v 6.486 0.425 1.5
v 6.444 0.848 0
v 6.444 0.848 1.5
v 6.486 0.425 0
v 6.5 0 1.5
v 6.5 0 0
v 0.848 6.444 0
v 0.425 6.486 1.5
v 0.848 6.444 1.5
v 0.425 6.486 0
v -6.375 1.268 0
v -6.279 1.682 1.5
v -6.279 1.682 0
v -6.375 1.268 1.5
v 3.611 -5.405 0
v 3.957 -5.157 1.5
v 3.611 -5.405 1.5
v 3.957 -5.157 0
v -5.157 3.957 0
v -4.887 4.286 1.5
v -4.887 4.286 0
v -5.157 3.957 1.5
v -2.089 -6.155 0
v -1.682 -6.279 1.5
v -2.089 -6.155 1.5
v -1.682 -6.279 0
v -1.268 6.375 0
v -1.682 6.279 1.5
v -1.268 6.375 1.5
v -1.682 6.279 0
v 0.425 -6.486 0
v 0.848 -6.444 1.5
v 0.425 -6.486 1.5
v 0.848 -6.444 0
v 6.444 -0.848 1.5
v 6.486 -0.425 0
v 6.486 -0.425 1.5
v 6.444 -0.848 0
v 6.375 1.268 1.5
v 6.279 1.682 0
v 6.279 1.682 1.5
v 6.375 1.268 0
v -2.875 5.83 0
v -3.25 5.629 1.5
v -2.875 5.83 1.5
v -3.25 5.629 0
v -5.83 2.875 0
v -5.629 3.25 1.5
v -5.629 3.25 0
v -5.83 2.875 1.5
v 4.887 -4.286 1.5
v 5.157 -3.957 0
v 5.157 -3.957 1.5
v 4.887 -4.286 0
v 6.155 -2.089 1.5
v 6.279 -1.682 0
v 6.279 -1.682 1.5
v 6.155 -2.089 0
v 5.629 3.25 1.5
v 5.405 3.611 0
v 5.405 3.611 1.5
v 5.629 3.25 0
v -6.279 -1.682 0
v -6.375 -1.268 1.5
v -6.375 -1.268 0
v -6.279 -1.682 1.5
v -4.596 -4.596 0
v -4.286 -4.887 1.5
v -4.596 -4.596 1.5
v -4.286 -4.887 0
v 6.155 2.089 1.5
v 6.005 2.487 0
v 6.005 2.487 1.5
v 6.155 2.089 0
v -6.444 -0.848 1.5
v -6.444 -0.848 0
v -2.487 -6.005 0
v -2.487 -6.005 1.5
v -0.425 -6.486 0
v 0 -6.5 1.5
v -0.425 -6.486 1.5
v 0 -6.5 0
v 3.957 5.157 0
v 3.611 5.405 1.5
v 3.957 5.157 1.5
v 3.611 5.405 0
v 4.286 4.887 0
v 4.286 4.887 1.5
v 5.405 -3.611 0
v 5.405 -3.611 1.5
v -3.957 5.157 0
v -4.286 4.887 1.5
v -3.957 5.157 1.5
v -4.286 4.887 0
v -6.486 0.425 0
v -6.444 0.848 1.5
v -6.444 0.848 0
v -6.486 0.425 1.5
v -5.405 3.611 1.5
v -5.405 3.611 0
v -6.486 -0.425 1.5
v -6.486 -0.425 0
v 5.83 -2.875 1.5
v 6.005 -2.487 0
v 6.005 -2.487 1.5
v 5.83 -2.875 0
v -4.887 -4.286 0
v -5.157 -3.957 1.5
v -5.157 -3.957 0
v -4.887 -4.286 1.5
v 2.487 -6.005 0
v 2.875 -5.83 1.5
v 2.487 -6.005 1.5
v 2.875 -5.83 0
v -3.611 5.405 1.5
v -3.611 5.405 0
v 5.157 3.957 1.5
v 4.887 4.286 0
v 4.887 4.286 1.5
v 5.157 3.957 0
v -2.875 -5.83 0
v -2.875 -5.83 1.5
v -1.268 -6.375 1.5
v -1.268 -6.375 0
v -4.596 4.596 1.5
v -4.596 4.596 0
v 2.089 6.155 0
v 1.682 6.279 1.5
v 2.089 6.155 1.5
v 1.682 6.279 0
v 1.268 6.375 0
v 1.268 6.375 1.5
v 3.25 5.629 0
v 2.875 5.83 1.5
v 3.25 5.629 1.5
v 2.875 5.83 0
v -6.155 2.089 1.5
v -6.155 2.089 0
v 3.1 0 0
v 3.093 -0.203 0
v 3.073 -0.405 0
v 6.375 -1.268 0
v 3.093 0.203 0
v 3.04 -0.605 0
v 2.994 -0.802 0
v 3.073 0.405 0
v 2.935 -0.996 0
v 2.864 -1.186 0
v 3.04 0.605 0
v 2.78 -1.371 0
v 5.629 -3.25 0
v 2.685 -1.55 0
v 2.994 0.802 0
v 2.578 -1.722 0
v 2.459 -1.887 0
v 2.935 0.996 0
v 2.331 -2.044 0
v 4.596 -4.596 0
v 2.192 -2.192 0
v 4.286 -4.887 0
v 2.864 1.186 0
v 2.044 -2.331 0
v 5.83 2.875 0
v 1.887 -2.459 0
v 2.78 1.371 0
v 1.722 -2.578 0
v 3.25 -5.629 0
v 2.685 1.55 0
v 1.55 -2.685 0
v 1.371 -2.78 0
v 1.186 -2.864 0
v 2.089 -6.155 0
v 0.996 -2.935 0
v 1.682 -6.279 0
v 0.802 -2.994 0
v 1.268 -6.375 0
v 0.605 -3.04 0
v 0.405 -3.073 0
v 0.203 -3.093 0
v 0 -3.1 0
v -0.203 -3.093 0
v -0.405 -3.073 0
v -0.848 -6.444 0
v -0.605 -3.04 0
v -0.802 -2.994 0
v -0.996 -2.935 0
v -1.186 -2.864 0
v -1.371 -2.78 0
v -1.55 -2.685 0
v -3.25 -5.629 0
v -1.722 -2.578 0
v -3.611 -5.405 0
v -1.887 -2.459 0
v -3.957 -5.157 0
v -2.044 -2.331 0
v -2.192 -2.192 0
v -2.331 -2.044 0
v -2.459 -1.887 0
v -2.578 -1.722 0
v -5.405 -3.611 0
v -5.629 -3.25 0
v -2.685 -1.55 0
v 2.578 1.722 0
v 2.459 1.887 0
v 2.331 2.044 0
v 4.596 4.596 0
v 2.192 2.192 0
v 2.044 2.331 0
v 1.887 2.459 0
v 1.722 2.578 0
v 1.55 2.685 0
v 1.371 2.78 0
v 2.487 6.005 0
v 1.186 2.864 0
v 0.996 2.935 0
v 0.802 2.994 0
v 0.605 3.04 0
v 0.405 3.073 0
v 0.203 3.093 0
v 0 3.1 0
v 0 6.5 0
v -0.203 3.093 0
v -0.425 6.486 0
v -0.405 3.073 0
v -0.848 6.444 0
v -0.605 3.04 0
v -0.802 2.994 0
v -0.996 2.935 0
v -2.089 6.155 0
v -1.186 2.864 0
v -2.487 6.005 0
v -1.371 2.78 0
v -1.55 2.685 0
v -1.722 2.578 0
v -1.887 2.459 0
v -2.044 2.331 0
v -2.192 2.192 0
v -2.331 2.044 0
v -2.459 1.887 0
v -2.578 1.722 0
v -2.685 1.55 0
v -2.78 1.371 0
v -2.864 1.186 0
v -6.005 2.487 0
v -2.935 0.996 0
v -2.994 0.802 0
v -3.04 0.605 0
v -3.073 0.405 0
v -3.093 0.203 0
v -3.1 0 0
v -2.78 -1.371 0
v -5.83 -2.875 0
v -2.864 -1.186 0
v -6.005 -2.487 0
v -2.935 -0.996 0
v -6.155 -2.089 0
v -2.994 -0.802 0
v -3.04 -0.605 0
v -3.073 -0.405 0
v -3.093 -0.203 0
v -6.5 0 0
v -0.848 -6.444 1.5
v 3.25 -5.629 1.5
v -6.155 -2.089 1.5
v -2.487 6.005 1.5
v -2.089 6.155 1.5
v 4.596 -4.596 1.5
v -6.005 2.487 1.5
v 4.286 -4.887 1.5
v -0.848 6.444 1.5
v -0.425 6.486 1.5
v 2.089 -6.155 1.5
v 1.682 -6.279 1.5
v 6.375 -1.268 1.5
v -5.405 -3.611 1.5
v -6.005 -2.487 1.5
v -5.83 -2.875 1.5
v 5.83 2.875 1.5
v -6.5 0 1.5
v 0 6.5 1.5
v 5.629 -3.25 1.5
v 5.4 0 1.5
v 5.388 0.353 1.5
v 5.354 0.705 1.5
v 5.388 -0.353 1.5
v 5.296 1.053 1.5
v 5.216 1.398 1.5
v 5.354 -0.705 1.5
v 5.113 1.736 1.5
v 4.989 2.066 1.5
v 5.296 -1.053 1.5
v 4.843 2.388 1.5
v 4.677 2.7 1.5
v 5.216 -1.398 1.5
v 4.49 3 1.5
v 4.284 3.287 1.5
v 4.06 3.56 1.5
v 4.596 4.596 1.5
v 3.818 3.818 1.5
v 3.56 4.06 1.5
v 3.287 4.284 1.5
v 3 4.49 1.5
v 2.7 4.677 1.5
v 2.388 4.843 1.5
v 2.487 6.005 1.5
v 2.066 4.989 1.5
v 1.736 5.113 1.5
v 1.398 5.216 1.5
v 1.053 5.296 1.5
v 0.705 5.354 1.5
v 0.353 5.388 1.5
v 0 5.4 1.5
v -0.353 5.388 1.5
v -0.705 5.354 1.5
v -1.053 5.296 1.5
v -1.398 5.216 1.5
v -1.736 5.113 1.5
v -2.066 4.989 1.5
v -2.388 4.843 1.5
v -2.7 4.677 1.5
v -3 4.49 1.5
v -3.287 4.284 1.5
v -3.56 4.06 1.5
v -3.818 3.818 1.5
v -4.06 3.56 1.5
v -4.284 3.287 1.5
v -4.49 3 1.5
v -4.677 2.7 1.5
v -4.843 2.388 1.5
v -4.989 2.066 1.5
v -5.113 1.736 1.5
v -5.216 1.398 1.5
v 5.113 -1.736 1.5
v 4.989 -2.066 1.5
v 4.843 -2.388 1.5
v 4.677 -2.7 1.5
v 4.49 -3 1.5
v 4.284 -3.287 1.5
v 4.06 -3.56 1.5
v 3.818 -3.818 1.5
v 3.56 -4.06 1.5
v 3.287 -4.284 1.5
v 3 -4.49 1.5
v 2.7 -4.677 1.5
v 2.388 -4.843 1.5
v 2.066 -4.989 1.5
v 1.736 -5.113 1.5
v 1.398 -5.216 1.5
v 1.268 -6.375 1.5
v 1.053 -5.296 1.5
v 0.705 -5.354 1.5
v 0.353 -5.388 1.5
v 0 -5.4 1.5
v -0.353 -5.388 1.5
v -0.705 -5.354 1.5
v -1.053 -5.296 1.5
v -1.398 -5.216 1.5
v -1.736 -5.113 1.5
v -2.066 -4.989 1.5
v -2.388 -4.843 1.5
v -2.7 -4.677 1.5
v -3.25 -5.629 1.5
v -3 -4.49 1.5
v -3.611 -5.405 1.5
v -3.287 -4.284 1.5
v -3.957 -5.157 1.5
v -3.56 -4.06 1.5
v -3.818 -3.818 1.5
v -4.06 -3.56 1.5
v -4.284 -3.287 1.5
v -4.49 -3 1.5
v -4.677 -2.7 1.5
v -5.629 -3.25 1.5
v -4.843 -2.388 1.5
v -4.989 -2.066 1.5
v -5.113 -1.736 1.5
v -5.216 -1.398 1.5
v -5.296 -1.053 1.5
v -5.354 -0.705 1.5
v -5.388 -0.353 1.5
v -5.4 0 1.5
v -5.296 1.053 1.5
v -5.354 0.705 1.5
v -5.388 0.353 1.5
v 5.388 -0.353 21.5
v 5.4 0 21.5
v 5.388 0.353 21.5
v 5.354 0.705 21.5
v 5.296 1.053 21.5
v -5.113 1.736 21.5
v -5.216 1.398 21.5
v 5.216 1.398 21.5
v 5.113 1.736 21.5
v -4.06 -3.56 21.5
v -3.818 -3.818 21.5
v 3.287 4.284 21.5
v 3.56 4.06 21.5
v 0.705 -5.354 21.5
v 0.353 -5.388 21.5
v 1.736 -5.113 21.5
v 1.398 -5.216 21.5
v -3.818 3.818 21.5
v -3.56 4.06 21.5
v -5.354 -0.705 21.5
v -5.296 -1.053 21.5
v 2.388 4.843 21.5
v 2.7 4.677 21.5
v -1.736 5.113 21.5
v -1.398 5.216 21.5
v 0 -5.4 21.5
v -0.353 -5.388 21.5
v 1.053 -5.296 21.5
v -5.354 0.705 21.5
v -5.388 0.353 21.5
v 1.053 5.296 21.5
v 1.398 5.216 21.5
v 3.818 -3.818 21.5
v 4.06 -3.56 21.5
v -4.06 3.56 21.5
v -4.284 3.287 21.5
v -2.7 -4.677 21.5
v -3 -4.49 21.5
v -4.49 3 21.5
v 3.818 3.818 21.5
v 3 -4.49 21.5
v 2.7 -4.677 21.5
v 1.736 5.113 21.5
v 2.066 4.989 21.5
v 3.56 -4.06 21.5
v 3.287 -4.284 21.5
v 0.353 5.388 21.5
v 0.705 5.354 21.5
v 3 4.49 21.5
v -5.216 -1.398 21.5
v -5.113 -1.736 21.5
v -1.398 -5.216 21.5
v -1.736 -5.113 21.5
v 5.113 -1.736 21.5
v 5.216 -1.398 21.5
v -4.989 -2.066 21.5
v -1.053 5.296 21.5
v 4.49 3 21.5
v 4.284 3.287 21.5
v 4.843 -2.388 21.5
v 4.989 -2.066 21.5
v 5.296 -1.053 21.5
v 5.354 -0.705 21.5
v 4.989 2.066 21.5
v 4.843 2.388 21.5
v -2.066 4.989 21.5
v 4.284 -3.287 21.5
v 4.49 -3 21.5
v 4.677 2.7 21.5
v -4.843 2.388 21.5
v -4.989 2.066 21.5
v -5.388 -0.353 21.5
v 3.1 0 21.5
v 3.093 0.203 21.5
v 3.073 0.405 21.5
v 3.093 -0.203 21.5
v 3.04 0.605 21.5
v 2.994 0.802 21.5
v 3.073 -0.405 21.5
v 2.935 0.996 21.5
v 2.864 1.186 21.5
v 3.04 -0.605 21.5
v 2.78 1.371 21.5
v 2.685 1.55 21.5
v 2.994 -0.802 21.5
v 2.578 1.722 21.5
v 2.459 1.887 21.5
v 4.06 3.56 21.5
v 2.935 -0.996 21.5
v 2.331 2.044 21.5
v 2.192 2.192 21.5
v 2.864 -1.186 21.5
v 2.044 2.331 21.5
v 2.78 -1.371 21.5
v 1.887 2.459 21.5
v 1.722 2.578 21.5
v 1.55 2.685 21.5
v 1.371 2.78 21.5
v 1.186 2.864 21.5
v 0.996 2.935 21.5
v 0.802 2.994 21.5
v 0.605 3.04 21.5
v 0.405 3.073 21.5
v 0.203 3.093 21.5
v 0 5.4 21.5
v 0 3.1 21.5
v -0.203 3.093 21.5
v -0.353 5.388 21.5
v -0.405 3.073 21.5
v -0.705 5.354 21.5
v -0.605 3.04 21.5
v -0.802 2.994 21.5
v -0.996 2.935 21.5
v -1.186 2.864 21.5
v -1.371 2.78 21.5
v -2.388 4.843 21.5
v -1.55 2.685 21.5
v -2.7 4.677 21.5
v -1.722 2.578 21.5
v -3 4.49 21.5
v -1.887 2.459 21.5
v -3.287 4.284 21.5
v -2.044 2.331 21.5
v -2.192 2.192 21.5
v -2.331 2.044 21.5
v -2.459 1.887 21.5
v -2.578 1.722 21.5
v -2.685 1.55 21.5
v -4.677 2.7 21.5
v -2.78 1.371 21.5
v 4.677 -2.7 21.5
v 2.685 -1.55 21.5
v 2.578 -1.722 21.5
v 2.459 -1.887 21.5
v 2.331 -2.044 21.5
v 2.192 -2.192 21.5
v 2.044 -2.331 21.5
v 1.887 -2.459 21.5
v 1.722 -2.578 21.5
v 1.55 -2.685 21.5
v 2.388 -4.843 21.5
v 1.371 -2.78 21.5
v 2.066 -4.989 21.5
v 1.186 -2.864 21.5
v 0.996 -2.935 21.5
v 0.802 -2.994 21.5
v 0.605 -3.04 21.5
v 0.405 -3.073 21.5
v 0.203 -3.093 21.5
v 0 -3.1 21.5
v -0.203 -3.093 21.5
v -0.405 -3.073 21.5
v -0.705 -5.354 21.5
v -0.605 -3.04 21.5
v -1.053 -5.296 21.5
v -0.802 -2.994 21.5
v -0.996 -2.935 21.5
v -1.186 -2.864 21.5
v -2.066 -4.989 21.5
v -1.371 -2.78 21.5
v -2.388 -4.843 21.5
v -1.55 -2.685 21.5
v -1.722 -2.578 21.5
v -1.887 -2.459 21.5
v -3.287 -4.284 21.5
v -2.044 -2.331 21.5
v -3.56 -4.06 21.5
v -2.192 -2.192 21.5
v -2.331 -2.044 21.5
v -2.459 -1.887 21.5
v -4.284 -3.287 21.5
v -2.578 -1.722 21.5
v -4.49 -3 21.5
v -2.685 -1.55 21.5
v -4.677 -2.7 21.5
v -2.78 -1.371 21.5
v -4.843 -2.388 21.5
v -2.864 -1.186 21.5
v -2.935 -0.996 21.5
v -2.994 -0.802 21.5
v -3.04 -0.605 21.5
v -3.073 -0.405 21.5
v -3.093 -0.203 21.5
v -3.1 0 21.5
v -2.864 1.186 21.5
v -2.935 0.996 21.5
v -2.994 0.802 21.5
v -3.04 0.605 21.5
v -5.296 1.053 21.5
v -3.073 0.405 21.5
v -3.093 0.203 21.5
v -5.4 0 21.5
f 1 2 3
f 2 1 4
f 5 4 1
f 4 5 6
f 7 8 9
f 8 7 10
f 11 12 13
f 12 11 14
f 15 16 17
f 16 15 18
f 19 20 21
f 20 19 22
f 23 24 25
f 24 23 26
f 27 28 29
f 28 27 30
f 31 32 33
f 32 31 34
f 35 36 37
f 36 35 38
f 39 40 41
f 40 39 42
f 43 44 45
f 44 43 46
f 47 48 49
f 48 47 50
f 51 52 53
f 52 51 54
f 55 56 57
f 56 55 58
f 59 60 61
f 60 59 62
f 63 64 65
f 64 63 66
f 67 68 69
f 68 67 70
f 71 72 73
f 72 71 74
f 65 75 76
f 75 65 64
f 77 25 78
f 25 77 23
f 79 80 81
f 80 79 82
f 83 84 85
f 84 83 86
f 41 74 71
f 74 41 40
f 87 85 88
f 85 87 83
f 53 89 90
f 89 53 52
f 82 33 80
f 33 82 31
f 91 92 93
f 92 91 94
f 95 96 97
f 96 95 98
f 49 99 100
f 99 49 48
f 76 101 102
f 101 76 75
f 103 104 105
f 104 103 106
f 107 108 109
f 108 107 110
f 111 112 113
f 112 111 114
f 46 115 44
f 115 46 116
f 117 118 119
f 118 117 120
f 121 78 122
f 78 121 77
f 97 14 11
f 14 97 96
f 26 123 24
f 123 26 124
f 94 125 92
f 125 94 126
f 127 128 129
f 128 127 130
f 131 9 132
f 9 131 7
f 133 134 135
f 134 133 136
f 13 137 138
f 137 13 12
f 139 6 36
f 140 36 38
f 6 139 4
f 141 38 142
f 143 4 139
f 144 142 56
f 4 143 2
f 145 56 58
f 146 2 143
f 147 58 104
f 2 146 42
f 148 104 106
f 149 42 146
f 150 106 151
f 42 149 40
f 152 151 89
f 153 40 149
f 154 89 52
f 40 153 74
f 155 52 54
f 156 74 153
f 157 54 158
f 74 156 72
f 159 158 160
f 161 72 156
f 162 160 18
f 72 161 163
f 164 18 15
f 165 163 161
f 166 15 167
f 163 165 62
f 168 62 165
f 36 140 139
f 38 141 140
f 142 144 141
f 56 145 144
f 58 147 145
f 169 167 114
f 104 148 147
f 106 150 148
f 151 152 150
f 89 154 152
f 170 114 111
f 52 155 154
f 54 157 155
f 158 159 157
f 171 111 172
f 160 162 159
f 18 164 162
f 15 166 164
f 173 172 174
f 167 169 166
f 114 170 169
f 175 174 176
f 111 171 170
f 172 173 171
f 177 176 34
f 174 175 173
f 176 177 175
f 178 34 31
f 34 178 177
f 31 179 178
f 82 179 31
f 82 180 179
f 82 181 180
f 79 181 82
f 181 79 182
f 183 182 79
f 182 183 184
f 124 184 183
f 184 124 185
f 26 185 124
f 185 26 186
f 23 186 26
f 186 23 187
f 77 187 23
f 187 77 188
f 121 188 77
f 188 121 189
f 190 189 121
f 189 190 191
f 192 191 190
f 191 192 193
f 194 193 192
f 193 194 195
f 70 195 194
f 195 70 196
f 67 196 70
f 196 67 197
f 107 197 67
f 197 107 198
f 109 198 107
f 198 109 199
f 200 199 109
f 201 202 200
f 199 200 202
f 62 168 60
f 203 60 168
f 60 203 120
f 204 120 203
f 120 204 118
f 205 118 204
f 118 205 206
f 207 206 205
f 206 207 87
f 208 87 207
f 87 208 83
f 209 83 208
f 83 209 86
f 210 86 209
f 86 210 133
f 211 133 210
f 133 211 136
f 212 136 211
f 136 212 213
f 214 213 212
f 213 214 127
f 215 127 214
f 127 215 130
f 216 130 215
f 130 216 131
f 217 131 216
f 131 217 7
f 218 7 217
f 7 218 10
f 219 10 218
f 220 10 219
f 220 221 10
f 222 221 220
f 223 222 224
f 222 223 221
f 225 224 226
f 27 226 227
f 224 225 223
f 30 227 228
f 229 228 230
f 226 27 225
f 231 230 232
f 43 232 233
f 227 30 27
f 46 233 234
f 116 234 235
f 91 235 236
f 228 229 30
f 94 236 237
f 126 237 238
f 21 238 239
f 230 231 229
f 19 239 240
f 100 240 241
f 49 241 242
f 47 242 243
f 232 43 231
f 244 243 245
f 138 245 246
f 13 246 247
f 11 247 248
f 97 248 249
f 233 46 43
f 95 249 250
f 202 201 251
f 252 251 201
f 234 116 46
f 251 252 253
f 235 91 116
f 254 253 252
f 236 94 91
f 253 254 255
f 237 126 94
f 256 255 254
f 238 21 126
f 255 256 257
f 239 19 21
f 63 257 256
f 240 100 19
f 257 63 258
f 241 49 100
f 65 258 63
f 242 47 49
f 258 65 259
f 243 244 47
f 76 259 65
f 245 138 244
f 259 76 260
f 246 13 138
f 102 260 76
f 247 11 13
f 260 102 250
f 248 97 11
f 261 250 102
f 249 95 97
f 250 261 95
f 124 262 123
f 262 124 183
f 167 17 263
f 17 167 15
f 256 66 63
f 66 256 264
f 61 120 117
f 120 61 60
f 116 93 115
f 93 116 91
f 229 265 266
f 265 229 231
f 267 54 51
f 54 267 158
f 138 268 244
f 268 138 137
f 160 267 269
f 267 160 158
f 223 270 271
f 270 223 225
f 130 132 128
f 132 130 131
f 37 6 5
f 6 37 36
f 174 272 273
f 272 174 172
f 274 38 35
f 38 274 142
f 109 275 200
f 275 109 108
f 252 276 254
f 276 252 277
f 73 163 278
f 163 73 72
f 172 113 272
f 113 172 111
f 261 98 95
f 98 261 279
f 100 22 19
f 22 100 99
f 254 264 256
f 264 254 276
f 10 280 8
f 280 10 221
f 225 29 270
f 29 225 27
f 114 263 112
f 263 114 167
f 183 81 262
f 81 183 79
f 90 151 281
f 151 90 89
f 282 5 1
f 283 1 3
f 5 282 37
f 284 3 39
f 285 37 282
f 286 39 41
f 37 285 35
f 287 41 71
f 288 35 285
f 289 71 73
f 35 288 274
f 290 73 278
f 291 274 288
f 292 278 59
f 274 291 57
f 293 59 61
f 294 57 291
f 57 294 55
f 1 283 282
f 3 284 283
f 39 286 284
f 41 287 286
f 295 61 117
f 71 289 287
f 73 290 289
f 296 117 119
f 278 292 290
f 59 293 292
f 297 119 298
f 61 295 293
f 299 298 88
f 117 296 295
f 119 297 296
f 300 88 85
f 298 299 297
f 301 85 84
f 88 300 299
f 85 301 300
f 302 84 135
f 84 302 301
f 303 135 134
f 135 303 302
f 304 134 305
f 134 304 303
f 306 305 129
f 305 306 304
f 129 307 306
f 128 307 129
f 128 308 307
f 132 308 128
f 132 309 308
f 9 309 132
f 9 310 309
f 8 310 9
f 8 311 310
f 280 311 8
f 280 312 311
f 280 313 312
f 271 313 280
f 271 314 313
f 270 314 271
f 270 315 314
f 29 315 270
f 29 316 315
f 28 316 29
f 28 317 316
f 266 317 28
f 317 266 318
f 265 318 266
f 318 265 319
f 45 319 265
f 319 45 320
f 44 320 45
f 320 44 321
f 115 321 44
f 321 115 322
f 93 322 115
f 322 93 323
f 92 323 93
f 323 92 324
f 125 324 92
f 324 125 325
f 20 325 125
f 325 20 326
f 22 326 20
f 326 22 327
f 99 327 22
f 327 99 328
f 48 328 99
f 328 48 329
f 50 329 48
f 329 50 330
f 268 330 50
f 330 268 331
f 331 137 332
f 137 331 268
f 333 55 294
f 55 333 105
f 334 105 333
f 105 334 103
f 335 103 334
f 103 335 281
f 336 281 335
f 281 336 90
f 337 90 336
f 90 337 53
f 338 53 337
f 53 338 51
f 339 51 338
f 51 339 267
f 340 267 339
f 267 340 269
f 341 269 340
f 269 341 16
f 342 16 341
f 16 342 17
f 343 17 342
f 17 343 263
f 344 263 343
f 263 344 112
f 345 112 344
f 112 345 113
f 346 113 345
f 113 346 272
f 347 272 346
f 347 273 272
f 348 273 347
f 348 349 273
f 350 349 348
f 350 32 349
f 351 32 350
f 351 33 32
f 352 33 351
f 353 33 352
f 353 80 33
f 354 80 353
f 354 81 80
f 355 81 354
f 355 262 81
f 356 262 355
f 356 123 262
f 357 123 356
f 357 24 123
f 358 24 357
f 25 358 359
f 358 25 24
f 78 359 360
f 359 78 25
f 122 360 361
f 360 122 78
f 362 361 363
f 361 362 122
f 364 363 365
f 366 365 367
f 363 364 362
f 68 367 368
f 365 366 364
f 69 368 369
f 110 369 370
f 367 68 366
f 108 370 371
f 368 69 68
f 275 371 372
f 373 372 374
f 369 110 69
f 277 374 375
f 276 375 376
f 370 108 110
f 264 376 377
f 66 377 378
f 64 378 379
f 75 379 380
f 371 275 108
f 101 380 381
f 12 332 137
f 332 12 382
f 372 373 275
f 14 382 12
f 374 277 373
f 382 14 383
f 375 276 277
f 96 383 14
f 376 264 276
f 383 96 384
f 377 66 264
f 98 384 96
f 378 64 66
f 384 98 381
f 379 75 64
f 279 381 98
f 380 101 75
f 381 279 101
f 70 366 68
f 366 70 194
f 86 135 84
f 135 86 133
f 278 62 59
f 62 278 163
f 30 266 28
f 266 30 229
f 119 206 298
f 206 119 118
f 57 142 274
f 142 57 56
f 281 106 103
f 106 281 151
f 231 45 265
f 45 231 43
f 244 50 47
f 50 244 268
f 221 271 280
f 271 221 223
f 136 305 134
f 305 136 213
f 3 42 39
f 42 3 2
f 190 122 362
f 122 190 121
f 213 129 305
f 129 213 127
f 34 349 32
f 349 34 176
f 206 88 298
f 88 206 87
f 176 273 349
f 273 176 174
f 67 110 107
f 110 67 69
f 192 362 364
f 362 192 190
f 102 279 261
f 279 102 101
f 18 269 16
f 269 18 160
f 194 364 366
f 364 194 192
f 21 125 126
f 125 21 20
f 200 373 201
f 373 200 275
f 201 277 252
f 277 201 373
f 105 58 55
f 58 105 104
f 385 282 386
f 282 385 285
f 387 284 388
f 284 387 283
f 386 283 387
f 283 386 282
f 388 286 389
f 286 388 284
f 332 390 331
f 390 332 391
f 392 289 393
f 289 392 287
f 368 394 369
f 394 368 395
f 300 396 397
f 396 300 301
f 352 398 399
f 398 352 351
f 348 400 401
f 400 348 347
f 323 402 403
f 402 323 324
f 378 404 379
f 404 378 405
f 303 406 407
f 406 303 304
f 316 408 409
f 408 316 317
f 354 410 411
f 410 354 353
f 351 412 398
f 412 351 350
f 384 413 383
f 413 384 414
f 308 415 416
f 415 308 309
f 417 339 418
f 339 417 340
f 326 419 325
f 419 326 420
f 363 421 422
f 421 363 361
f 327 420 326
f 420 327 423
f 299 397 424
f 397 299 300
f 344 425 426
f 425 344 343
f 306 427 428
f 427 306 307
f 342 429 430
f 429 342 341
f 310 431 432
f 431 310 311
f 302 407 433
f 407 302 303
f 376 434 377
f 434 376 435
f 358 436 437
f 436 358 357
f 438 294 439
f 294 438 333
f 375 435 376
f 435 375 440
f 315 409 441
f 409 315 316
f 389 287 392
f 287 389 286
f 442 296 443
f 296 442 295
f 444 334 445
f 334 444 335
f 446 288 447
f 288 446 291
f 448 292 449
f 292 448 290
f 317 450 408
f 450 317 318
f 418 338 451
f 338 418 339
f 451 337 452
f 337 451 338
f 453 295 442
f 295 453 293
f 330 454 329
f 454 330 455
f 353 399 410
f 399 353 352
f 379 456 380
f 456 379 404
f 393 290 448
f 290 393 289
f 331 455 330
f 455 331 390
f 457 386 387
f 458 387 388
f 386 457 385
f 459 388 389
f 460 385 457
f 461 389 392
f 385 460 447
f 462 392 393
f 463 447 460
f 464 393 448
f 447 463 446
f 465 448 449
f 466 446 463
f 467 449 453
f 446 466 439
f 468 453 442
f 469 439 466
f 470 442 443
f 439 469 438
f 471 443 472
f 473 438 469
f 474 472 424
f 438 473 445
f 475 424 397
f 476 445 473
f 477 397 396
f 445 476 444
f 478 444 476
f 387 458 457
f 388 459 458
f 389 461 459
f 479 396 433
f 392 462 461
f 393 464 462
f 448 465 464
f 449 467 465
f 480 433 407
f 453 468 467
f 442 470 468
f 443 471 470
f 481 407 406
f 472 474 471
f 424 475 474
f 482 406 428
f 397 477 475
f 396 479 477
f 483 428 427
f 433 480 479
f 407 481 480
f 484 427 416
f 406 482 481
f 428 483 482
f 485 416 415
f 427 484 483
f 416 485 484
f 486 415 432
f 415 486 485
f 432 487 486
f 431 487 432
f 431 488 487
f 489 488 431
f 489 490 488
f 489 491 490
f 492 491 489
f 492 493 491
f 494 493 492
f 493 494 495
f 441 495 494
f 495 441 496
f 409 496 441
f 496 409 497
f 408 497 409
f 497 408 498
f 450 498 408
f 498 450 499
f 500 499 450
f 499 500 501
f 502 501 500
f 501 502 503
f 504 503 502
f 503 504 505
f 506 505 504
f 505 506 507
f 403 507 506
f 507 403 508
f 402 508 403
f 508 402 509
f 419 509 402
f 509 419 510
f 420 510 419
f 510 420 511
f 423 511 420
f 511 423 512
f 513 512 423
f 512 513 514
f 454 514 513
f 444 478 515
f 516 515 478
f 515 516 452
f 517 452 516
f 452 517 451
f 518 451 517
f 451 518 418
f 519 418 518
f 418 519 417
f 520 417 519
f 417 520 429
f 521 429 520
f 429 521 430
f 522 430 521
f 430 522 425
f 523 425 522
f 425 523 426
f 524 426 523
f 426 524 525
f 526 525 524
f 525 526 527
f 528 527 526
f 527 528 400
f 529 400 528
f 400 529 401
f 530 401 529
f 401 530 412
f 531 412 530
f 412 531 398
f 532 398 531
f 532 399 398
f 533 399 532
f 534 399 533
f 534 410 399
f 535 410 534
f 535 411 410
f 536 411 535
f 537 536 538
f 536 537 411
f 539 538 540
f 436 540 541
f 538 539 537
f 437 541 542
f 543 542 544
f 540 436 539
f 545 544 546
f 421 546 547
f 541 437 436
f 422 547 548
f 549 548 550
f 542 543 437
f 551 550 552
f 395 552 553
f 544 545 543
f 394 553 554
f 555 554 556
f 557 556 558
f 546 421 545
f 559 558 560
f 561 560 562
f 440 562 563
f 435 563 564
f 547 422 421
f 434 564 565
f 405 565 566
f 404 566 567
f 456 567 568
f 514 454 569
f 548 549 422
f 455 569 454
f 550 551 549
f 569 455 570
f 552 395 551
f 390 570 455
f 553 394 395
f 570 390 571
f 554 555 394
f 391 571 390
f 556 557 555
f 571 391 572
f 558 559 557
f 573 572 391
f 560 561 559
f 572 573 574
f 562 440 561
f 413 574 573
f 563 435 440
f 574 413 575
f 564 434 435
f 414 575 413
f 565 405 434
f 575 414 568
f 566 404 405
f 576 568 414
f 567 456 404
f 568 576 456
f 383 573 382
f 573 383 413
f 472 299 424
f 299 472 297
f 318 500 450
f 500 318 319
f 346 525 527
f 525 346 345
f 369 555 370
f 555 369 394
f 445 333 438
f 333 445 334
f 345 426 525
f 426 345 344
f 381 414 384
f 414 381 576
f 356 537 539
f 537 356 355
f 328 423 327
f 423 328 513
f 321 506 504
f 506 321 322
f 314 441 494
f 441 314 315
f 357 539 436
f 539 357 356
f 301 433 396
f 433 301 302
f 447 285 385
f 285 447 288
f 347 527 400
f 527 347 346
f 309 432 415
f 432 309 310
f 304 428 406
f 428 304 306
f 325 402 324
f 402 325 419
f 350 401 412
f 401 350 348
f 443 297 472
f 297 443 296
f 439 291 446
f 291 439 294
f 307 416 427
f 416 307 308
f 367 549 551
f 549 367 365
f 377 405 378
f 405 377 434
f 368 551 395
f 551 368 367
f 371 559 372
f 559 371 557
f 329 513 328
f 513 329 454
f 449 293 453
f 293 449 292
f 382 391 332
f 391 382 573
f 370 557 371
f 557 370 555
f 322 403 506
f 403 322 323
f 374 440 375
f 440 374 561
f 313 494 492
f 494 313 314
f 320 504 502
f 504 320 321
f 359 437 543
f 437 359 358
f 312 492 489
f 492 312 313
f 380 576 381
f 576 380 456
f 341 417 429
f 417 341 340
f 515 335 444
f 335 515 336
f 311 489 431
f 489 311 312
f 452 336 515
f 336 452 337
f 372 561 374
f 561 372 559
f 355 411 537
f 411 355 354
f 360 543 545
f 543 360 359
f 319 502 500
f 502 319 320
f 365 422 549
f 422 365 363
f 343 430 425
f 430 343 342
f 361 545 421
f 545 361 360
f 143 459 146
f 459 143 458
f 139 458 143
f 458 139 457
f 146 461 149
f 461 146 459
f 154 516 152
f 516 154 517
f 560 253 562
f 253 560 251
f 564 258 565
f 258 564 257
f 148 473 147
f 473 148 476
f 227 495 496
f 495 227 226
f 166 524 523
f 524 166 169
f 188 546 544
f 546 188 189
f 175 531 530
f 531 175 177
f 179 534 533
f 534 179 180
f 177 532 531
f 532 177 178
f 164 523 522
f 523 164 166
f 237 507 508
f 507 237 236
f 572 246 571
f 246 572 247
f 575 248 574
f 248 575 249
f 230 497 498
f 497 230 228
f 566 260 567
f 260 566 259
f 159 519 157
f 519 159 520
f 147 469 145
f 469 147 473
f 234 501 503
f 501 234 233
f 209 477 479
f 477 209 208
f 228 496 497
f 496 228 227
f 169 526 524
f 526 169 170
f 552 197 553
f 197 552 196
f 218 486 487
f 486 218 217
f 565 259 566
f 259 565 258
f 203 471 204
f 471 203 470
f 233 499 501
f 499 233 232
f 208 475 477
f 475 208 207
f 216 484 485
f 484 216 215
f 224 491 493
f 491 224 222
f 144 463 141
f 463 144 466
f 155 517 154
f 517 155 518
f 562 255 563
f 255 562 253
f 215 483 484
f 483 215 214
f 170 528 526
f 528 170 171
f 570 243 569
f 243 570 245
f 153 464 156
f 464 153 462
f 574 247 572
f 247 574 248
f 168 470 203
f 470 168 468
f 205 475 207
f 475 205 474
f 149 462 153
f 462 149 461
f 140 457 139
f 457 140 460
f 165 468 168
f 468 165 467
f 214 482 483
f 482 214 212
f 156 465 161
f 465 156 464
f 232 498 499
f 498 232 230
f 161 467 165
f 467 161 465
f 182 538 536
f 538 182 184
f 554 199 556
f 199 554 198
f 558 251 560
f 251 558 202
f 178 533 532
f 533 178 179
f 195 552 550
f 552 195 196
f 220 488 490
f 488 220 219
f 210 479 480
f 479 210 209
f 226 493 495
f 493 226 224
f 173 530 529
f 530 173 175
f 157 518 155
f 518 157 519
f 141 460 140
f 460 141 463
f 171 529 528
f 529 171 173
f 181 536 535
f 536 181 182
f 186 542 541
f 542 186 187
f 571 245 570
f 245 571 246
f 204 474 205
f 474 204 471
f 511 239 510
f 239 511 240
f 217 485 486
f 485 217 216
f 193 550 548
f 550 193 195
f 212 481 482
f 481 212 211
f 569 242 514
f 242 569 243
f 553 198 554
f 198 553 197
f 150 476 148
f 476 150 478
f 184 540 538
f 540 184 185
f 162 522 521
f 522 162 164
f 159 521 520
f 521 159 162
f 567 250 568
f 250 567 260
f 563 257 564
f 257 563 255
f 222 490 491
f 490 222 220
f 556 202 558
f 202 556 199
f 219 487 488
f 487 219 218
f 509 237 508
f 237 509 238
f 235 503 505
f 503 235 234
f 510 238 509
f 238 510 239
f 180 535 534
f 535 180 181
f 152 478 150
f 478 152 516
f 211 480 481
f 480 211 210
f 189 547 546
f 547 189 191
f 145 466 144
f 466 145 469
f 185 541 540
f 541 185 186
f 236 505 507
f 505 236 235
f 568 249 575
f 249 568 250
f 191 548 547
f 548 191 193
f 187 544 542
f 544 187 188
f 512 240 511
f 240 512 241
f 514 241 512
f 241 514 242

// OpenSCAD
// PCR tube adapter sleeve - print upside down
// Units: mm

$fn = 96;

// --- Dimensions ---
collar_d      = 13;    // collar outer diameter (on bed)
collar_h      = 1.5;   // collar thickness (z = 0 to 1.5)
sleeve_od     = 10.8;  // sleeve outer diameter
sleeve_top_z  = 21.5;  // top of sleeve body (z)
bore_d        = 6.2;   // through-bore diameter
eps           = 0.5;   // cutter overshoot

difference() {
    union() {
        // Collar
        cylinder(d = collar_d, h = collar_h);
        // Sleeve body (slightly overlapping collar for a clean union)
        translate([0, 0, collar_h - 0.01])
            cylinder(d = sleeve_od, h = sleeve_top_z - collar_h + 0.01);
    }
    // Through bore
    translate([0, 0, -eps])
        cylinder(d = bore_d, h = sleeve_top_z + 2 * eps);
}
